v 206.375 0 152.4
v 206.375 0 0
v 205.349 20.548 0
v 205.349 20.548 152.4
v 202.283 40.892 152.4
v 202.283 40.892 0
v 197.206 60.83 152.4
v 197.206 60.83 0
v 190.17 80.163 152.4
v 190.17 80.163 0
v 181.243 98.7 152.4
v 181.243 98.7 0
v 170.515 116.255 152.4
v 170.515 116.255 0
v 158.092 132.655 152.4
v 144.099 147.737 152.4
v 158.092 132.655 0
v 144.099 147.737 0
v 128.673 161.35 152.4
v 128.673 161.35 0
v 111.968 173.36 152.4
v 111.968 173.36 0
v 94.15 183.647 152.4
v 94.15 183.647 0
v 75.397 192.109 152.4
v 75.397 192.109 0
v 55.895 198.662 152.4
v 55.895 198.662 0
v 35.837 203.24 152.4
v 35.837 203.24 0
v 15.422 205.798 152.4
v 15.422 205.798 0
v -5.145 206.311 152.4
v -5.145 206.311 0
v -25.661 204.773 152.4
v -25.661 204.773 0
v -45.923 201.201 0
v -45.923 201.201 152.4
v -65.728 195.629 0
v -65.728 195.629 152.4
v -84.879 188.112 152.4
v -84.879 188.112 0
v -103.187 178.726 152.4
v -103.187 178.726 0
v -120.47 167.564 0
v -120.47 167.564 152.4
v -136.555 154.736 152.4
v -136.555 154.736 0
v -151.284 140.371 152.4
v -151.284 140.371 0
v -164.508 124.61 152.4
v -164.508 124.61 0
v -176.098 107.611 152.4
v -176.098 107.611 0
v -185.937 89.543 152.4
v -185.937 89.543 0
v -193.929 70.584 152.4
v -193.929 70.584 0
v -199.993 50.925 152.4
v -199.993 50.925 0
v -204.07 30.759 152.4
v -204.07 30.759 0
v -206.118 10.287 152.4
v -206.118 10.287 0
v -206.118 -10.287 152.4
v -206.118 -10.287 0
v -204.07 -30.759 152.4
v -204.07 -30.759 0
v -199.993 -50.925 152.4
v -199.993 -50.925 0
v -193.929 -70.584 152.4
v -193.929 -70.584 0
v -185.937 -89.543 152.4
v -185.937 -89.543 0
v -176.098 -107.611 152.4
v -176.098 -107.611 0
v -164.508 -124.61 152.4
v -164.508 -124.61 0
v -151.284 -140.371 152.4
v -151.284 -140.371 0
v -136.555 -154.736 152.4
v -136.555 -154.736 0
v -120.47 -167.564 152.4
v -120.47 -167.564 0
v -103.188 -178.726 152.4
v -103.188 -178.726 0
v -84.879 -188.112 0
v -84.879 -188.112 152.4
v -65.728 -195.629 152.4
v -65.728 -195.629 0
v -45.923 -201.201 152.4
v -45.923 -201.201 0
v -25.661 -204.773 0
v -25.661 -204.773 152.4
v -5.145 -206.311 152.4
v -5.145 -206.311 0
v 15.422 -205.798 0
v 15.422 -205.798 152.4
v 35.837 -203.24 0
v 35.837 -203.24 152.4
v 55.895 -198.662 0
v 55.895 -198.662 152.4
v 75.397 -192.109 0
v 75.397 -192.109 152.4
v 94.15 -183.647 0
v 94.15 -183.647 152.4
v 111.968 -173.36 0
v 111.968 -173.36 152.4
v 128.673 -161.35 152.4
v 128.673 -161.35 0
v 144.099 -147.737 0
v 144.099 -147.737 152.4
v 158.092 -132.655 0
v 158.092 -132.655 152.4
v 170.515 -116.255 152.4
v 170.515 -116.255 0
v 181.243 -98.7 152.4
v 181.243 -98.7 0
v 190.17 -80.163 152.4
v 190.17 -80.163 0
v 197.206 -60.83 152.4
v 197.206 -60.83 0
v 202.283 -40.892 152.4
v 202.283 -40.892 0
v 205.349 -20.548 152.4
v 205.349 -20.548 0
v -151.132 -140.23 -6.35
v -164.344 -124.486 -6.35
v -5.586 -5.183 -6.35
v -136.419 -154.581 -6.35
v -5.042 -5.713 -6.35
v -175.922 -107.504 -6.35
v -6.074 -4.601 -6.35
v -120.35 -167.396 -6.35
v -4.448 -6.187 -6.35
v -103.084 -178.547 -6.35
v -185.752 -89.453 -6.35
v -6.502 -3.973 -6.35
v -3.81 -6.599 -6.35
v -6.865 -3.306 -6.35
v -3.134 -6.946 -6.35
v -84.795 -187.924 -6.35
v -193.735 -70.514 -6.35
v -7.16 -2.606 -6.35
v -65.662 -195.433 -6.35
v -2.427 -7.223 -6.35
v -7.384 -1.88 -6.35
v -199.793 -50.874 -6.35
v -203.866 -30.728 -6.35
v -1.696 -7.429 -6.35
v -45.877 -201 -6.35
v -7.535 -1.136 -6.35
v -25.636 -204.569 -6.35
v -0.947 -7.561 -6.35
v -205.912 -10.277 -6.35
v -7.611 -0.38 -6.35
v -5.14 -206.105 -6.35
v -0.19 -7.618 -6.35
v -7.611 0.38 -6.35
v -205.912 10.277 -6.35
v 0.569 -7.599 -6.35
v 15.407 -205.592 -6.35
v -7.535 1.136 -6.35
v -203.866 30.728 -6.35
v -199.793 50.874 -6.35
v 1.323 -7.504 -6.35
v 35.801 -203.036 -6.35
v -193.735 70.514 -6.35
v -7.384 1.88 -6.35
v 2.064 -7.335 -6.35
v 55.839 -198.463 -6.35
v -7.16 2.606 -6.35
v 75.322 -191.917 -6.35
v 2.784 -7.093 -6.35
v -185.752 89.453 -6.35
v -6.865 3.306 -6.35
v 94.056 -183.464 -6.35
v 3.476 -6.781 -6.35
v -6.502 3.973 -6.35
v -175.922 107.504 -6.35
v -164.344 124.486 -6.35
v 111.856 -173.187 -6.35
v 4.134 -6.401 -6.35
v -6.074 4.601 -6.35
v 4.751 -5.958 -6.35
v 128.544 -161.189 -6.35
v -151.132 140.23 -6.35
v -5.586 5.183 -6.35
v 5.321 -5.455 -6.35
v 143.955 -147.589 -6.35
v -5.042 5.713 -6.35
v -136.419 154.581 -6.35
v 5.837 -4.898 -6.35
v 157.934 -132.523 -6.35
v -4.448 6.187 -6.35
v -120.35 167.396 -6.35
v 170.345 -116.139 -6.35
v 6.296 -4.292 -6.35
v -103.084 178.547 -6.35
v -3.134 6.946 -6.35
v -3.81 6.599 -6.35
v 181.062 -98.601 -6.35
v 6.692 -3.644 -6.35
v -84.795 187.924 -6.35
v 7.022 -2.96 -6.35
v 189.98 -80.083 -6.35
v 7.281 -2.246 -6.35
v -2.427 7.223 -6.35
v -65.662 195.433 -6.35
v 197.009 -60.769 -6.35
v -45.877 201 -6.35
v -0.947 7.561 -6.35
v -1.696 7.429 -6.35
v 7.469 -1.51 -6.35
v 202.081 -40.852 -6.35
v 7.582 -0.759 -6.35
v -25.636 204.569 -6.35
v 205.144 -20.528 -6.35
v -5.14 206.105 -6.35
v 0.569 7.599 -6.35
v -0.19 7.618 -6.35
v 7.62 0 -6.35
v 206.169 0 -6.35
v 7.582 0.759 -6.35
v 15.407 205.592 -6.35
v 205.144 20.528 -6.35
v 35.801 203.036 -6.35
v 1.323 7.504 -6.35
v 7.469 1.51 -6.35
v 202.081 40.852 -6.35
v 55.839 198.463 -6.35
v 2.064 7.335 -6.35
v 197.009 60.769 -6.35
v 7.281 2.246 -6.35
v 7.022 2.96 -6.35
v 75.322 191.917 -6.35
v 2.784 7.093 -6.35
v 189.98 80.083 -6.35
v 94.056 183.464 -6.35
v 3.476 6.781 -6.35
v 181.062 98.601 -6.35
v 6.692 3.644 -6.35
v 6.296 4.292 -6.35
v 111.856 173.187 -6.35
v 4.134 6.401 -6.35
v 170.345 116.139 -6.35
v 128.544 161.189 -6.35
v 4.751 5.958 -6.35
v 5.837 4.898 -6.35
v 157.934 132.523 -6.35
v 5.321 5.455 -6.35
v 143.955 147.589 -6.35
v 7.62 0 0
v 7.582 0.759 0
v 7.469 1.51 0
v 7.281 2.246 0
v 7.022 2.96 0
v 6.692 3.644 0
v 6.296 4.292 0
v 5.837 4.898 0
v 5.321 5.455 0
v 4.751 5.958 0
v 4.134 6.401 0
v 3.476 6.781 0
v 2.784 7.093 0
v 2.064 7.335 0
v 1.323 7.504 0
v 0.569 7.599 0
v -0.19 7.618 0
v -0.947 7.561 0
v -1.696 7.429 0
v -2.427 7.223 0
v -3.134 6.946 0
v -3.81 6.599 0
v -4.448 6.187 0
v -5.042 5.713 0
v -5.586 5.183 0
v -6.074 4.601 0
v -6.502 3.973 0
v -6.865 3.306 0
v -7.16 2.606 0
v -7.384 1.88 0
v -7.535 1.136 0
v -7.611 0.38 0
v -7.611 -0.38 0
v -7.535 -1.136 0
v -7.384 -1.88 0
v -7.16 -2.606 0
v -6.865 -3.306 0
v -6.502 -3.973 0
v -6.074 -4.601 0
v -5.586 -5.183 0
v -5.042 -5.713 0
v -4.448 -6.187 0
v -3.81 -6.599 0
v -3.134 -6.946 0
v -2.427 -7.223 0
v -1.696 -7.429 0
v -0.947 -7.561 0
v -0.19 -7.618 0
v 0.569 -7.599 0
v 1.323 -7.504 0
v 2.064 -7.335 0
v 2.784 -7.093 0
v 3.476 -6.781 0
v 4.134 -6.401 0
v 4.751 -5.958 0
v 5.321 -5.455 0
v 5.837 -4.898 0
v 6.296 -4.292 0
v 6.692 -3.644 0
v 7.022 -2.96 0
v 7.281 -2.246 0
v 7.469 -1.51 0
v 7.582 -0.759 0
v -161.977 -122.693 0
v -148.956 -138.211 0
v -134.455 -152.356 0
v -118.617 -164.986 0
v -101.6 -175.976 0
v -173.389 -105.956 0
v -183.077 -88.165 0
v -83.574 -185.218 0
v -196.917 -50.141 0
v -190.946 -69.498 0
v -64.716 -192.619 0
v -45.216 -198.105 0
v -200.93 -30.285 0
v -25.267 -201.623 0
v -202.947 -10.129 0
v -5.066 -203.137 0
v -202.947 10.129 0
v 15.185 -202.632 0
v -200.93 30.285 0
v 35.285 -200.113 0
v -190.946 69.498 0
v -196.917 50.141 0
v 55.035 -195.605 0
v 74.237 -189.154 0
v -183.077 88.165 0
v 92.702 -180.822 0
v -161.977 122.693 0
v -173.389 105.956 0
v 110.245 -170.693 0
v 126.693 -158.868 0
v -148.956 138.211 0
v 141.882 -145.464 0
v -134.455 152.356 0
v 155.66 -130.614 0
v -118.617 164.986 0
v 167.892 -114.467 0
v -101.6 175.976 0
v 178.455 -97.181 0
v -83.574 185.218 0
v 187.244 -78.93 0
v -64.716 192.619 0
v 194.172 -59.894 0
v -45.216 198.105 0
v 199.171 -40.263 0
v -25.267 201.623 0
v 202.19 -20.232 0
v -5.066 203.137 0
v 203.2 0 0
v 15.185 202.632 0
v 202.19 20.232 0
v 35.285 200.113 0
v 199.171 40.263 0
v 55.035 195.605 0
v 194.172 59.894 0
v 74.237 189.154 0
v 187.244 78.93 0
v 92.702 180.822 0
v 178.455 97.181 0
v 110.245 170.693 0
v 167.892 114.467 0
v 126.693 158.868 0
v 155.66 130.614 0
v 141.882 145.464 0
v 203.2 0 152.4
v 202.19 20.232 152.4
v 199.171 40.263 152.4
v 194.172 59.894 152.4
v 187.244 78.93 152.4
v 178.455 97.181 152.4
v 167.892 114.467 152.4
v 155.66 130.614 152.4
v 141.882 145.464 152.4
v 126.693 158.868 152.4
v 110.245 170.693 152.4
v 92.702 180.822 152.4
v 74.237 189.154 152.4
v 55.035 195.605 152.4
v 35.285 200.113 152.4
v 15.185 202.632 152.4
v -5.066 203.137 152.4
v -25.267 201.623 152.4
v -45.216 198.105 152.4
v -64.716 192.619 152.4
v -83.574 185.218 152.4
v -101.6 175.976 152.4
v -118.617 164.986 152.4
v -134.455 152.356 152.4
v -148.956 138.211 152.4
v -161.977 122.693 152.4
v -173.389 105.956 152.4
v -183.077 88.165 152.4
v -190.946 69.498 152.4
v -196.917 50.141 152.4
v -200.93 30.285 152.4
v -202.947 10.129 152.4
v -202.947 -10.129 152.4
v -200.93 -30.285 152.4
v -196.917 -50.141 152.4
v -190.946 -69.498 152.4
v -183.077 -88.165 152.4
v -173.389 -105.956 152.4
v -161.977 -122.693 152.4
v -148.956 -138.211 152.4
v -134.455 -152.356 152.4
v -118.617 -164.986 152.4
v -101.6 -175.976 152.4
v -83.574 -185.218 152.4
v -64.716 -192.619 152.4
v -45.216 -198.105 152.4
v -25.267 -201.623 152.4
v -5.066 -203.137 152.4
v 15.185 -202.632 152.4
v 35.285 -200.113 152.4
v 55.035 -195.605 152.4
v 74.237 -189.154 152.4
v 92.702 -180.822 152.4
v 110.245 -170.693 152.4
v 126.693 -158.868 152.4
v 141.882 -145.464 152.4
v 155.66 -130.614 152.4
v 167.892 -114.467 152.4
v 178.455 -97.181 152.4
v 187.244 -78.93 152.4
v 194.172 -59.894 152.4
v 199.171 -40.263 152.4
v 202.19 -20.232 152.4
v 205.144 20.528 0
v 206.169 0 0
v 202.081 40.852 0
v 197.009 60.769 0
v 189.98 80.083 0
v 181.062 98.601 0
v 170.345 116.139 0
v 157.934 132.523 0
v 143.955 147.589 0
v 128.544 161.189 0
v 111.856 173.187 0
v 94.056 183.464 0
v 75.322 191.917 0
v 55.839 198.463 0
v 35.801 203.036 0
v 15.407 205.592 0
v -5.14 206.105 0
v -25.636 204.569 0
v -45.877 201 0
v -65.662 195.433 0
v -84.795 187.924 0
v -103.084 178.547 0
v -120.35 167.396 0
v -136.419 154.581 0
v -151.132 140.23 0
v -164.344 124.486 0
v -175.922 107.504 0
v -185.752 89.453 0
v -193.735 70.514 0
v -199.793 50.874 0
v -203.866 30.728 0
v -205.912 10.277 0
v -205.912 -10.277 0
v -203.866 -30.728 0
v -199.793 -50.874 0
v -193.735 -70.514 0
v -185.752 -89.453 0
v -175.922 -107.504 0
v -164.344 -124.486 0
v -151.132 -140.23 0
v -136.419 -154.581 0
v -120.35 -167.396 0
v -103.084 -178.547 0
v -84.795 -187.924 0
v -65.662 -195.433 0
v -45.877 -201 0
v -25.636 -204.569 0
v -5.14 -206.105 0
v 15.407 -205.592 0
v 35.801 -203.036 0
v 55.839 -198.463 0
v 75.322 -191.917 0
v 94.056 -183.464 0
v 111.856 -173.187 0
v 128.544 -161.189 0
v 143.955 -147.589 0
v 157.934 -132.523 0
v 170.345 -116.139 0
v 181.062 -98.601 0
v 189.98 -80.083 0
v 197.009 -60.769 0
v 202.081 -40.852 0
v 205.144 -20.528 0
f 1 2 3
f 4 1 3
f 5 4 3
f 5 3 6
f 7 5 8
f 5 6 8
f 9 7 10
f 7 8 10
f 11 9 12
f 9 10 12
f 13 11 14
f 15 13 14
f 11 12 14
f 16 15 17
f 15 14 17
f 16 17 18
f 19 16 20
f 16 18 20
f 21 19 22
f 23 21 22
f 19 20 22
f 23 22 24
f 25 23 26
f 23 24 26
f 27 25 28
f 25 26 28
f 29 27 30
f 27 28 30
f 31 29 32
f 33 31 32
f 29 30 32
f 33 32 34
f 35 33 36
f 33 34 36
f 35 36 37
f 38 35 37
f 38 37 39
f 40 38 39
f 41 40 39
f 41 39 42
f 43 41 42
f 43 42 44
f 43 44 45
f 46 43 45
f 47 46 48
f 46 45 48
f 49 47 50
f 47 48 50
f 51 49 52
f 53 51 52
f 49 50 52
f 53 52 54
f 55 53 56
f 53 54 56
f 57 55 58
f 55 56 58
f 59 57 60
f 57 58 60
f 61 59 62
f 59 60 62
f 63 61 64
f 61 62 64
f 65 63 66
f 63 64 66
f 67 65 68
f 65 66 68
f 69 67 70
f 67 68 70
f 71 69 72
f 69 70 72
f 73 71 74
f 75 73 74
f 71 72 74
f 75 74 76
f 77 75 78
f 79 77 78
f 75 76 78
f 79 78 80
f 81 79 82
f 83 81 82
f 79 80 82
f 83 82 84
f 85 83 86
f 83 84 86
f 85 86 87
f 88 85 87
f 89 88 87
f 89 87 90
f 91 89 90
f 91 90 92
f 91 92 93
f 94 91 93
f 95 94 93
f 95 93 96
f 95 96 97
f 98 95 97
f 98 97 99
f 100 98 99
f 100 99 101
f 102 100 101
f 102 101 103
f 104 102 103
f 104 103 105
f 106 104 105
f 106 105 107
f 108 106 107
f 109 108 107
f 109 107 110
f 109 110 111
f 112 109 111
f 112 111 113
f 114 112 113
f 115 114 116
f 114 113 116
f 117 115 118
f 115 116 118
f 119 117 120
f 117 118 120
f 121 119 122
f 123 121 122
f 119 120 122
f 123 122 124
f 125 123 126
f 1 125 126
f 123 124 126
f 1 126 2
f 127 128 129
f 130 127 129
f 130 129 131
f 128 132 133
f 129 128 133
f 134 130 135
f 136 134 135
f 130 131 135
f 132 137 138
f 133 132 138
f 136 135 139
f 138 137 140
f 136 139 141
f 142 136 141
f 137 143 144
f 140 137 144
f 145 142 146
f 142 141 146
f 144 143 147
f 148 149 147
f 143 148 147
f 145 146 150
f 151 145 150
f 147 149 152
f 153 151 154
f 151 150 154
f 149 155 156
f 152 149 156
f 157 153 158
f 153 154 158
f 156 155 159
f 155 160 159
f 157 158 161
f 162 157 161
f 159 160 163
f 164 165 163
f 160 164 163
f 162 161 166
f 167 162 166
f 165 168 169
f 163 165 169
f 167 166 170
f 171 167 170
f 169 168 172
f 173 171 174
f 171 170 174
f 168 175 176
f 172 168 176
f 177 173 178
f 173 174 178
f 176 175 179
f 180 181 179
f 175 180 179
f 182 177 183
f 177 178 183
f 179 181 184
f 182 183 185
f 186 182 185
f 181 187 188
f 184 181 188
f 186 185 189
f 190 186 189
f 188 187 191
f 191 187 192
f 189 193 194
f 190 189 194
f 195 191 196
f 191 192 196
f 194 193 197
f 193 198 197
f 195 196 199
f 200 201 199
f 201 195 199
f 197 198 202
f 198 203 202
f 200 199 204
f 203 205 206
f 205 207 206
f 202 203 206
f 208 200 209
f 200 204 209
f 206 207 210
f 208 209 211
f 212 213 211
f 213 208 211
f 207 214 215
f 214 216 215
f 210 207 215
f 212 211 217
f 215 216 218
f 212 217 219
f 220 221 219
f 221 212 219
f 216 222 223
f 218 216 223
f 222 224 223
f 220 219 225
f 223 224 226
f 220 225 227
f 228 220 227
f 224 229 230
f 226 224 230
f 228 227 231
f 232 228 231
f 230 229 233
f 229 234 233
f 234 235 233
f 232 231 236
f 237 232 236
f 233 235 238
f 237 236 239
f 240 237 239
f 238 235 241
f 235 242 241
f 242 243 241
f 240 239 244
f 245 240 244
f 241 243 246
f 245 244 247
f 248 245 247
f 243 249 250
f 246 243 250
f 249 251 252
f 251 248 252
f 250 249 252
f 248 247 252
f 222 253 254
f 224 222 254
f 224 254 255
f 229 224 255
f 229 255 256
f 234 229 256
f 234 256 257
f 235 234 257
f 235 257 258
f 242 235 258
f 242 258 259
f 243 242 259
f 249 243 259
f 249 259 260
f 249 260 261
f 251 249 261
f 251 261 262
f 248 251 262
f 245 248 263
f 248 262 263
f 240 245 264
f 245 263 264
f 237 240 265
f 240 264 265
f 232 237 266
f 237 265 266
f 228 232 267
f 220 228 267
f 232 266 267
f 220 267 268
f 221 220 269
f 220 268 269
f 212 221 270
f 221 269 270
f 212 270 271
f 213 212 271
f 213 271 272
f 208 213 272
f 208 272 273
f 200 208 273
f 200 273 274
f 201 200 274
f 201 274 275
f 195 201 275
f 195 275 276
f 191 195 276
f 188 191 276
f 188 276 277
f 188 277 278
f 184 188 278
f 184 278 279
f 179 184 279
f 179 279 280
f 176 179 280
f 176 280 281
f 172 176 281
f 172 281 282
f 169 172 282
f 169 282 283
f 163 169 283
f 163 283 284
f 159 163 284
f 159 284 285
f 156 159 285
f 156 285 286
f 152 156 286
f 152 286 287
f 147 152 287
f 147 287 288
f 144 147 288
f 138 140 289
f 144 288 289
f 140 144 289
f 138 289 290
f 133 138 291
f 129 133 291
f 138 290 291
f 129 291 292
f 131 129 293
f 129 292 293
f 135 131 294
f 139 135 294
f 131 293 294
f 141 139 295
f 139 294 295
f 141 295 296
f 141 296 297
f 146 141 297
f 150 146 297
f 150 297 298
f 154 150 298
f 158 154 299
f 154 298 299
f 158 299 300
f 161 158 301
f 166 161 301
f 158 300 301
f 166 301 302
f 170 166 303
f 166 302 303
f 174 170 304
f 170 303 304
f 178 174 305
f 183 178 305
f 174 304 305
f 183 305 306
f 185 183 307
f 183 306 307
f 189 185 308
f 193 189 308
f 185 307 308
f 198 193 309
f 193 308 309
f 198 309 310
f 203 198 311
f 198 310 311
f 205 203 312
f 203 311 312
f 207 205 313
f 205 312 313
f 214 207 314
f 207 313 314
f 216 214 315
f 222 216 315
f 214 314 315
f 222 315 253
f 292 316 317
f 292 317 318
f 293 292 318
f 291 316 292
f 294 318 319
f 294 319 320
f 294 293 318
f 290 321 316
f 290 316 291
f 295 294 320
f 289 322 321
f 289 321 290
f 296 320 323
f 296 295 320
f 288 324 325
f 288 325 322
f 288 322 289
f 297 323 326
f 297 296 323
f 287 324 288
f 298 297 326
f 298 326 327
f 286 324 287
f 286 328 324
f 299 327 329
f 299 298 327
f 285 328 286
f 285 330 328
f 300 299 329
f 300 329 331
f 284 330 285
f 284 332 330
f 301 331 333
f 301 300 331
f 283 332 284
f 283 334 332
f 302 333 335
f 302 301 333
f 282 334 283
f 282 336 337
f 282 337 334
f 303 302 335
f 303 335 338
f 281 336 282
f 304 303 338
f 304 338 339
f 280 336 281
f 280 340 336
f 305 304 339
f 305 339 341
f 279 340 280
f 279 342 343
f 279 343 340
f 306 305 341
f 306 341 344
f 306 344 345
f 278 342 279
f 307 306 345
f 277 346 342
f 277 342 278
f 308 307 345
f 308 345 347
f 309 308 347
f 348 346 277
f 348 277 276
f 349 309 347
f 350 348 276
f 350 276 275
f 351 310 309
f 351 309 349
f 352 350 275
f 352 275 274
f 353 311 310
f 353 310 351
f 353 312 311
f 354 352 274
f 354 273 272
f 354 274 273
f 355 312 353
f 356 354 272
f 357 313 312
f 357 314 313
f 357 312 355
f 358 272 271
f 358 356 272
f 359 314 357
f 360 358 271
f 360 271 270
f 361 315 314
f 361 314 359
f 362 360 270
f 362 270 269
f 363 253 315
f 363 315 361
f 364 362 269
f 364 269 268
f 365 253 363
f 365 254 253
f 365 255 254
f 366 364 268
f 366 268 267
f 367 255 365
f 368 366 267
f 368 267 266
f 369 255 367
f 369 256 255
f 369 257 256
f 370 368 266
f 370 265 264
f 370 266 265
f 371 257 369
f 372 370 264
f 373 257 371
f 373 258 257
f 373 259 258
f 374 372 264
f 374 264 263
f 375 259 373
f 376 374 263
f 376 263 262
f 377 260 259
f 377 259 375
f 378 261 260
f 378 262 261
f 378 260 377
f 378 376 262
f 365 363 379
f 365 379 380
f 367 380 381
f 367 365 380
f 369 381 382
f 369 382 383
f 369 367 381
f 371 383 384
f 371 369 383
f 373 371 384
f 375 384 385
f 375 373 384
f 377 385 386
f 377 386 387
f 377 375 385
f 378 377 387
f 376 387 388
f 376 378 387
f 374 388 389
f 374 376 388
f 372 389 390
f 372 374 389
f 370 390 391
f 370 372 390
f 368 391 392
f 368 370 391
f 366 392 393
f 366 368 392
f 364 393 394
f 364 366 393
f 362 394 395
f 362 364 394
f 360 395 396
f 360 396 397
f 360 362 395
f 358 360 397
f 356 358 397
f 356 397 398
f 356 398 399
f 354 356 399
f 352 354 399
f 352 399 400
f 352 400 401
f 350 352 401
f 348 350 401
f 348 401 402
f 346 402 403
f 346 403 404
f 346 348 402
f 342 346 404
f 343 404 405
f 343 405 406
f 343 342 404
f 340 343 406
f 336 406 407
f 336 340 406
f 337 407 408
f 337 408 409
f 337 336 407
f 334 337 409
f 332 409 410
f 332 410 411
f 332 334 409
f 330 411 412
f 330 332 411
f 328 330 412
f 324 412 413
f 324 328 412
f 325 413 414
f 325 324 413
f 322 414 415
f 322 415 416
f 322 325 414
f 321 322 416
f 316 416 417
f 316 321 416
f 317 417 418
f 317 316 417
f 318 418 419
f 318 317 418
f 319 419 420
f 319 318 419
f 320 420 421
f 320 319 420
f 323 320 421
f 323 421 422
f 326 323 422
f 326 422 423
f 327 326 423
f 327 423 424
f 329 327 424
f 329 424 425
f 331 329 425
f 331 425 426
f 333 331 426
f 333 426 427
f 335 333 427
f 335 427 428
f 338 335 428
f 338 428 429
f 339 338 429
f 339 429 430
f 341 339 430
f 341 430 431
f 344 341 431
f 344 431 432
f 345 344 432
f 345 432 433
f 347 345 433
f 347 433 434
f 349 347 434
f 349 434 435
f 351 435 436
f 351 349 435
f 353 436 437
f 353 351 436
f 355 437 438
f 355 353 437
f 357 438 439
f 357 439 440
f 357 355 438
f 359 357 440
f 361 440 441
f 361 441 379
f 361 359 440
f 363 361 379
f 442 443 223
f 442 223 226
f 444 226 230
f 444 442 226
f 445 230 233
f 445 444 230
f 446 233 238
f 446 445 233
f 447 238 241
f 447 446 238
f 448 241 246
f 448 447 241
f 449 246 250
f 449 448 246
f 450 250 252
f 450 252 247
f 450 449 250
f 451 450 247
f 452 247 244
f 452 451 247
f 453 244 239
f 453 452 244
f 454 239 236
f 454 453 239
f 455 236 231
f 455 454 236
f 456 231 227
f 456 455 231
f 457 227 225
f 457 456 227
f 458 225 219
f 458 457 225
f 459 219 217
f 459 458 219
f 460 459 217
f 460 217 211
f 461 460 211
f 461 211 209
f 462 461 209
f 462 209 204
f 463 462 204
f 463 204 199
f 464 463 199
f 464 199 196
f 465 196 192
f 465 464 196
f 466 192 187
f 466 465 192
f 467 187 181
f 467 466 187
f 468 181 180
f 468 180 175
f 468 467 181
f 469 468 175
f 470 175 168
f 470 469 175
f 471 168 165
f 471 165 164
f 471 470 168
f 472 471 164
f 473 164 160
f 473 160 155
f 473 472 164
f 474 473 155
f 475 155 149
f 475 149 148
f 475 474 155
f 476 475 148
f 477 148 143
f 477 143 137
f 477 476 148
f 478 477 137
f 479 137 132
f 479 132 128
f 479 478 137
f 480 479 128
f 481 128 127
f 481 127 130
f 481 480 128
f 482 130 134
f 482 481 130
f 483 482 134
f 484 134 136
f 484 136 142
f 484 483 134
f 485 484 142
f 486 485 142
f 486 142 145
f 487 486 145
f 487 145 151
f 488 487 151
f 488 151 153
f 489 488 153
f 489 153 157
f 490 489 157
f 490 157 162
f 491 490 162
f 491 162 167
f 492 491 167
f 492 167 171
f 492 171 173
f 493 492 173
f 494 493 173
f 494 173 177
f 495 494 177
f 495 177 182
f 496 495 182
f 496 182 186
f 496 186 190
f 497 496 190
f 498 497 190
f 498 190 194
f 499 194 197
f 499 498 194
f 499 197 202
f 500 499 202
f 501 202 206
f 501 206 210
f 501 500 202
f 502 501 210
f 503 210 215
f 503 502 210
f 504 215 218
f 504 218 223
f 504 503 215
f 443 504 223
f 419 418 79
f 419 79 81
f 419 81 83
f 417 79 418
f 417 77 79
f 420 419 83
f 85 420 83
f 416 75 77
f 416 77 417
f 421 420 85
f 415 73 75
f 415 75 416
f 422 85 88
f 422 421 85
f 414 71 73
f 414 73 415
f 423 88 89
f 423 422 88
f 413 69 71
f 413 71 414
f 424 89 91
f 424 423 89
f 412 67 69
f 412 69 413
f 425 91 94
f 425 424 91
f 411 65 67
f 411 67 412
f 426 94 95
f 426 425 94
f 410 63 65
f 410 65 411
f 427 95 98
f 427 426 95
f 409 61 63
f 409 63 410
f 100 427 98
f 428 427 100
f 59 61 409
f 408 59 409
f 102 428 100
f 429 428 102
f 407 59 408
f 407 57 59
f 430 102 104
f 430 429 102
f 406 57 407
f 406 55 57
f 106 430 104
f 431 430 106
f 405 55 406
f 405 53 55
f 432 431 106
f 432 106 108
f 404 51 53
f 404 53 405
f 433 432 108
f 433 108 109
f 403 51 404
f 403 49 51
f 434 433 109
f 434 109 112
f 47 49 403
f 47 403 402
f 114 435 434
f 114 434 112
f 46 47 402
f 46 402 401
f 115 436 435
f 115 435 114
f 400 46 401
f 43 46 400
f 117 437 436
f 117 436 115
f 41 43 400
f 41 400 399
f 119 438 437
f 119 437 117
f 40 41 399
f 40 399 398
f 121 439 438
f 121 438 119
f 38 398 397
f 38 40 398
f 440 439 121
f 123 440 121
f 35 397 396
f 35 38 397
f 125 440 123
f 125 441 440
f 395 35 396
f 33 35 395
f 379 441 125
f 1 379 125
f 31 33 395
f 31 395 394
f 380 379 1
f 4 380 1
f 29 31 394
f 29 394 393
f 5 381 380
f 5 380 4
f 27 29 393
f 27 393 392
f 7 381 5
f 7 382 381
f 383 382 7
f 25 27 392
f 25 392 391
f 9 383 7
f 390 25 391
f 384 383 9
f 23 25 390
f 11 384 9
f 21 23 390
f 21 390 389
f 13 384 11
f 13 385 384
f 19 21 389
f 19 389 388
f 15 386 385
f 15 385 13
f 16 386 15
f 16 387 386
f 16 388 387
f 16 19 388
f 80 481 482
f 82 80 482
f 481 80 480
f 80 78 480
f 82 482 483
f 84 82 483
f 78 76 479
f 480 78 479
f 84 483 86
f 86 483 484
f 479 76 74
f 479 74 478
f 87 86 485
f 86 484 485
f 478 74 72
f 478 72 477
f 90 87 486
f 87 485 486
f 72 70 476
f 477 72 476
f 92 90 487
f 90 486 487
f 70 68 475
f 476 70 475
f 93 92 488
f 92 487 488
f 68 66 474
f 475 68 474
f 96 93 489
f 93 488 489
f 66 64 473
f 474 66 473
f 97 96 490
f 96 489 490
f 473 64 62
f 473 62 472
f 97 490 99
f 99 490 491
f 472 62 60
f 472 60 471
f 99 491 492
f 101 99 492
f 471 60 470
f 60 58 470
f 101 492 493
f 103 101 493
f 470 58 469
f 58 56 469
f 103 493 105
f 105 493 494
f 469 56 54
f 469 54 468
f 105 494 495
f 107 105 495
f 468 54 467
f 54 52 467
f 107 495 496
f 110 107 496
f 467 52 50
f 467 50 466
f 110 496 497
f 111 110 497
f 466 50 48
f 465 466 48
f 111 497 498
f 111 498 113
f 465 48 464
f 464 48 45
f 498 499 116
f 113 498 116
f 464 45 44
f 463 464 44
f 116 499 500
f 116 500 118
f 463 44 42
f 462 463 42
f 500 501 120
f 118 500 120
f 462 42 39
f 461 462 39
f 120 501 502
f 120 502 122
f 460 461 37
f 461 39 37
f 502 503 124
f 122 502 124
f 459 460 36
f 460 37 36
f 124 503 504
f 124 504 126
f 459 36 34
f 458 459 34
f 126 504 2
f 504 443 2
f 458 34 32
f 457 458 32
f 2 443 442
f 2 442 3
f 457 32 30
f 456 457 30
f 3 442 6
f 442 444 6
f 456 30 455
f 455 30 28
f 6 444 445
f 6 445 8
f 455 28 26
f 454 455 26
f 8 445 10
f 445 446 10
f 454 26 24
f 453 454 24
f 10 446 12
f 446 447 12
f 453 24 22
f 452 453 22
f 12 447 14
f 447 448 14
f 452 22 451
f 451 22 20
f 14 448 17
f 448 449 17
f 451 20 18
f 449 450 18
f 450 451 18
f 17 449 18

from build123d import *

# Parameters (mm, degrees)
F0_R     = 206.375
F0_R_2   = 203.2
F1_DEPTH = 152.4
F2_R     = 206.168646
F3_DEPTH = 6.35
F4_R     = 7.62
F5_DEPTH = 25.4


with BuildPart() as f1:
    # F0 (on Top) → F1 (new body)
    with BuildSketch(Plane.XY):
        Circle(F0_R)
        Circle(F0_R_2, mode=Mode.SUBTRACT)
    extrude(amount=F1_DEPTH)

    # F2 (on Top) → F3 (join)
    with BuildSketch(Plane.XY):
        Circle(F2_R)
    extrude(amount=-F3_DEPTH)

    # F4 (on face) → F5 (cut)
    with BuildSketch(Plane.XY):
        Circle(F4_R)
    extrude(amount=-F5_DEPTH, mode=Mode.SUBTRACT)


solid = f1.part
